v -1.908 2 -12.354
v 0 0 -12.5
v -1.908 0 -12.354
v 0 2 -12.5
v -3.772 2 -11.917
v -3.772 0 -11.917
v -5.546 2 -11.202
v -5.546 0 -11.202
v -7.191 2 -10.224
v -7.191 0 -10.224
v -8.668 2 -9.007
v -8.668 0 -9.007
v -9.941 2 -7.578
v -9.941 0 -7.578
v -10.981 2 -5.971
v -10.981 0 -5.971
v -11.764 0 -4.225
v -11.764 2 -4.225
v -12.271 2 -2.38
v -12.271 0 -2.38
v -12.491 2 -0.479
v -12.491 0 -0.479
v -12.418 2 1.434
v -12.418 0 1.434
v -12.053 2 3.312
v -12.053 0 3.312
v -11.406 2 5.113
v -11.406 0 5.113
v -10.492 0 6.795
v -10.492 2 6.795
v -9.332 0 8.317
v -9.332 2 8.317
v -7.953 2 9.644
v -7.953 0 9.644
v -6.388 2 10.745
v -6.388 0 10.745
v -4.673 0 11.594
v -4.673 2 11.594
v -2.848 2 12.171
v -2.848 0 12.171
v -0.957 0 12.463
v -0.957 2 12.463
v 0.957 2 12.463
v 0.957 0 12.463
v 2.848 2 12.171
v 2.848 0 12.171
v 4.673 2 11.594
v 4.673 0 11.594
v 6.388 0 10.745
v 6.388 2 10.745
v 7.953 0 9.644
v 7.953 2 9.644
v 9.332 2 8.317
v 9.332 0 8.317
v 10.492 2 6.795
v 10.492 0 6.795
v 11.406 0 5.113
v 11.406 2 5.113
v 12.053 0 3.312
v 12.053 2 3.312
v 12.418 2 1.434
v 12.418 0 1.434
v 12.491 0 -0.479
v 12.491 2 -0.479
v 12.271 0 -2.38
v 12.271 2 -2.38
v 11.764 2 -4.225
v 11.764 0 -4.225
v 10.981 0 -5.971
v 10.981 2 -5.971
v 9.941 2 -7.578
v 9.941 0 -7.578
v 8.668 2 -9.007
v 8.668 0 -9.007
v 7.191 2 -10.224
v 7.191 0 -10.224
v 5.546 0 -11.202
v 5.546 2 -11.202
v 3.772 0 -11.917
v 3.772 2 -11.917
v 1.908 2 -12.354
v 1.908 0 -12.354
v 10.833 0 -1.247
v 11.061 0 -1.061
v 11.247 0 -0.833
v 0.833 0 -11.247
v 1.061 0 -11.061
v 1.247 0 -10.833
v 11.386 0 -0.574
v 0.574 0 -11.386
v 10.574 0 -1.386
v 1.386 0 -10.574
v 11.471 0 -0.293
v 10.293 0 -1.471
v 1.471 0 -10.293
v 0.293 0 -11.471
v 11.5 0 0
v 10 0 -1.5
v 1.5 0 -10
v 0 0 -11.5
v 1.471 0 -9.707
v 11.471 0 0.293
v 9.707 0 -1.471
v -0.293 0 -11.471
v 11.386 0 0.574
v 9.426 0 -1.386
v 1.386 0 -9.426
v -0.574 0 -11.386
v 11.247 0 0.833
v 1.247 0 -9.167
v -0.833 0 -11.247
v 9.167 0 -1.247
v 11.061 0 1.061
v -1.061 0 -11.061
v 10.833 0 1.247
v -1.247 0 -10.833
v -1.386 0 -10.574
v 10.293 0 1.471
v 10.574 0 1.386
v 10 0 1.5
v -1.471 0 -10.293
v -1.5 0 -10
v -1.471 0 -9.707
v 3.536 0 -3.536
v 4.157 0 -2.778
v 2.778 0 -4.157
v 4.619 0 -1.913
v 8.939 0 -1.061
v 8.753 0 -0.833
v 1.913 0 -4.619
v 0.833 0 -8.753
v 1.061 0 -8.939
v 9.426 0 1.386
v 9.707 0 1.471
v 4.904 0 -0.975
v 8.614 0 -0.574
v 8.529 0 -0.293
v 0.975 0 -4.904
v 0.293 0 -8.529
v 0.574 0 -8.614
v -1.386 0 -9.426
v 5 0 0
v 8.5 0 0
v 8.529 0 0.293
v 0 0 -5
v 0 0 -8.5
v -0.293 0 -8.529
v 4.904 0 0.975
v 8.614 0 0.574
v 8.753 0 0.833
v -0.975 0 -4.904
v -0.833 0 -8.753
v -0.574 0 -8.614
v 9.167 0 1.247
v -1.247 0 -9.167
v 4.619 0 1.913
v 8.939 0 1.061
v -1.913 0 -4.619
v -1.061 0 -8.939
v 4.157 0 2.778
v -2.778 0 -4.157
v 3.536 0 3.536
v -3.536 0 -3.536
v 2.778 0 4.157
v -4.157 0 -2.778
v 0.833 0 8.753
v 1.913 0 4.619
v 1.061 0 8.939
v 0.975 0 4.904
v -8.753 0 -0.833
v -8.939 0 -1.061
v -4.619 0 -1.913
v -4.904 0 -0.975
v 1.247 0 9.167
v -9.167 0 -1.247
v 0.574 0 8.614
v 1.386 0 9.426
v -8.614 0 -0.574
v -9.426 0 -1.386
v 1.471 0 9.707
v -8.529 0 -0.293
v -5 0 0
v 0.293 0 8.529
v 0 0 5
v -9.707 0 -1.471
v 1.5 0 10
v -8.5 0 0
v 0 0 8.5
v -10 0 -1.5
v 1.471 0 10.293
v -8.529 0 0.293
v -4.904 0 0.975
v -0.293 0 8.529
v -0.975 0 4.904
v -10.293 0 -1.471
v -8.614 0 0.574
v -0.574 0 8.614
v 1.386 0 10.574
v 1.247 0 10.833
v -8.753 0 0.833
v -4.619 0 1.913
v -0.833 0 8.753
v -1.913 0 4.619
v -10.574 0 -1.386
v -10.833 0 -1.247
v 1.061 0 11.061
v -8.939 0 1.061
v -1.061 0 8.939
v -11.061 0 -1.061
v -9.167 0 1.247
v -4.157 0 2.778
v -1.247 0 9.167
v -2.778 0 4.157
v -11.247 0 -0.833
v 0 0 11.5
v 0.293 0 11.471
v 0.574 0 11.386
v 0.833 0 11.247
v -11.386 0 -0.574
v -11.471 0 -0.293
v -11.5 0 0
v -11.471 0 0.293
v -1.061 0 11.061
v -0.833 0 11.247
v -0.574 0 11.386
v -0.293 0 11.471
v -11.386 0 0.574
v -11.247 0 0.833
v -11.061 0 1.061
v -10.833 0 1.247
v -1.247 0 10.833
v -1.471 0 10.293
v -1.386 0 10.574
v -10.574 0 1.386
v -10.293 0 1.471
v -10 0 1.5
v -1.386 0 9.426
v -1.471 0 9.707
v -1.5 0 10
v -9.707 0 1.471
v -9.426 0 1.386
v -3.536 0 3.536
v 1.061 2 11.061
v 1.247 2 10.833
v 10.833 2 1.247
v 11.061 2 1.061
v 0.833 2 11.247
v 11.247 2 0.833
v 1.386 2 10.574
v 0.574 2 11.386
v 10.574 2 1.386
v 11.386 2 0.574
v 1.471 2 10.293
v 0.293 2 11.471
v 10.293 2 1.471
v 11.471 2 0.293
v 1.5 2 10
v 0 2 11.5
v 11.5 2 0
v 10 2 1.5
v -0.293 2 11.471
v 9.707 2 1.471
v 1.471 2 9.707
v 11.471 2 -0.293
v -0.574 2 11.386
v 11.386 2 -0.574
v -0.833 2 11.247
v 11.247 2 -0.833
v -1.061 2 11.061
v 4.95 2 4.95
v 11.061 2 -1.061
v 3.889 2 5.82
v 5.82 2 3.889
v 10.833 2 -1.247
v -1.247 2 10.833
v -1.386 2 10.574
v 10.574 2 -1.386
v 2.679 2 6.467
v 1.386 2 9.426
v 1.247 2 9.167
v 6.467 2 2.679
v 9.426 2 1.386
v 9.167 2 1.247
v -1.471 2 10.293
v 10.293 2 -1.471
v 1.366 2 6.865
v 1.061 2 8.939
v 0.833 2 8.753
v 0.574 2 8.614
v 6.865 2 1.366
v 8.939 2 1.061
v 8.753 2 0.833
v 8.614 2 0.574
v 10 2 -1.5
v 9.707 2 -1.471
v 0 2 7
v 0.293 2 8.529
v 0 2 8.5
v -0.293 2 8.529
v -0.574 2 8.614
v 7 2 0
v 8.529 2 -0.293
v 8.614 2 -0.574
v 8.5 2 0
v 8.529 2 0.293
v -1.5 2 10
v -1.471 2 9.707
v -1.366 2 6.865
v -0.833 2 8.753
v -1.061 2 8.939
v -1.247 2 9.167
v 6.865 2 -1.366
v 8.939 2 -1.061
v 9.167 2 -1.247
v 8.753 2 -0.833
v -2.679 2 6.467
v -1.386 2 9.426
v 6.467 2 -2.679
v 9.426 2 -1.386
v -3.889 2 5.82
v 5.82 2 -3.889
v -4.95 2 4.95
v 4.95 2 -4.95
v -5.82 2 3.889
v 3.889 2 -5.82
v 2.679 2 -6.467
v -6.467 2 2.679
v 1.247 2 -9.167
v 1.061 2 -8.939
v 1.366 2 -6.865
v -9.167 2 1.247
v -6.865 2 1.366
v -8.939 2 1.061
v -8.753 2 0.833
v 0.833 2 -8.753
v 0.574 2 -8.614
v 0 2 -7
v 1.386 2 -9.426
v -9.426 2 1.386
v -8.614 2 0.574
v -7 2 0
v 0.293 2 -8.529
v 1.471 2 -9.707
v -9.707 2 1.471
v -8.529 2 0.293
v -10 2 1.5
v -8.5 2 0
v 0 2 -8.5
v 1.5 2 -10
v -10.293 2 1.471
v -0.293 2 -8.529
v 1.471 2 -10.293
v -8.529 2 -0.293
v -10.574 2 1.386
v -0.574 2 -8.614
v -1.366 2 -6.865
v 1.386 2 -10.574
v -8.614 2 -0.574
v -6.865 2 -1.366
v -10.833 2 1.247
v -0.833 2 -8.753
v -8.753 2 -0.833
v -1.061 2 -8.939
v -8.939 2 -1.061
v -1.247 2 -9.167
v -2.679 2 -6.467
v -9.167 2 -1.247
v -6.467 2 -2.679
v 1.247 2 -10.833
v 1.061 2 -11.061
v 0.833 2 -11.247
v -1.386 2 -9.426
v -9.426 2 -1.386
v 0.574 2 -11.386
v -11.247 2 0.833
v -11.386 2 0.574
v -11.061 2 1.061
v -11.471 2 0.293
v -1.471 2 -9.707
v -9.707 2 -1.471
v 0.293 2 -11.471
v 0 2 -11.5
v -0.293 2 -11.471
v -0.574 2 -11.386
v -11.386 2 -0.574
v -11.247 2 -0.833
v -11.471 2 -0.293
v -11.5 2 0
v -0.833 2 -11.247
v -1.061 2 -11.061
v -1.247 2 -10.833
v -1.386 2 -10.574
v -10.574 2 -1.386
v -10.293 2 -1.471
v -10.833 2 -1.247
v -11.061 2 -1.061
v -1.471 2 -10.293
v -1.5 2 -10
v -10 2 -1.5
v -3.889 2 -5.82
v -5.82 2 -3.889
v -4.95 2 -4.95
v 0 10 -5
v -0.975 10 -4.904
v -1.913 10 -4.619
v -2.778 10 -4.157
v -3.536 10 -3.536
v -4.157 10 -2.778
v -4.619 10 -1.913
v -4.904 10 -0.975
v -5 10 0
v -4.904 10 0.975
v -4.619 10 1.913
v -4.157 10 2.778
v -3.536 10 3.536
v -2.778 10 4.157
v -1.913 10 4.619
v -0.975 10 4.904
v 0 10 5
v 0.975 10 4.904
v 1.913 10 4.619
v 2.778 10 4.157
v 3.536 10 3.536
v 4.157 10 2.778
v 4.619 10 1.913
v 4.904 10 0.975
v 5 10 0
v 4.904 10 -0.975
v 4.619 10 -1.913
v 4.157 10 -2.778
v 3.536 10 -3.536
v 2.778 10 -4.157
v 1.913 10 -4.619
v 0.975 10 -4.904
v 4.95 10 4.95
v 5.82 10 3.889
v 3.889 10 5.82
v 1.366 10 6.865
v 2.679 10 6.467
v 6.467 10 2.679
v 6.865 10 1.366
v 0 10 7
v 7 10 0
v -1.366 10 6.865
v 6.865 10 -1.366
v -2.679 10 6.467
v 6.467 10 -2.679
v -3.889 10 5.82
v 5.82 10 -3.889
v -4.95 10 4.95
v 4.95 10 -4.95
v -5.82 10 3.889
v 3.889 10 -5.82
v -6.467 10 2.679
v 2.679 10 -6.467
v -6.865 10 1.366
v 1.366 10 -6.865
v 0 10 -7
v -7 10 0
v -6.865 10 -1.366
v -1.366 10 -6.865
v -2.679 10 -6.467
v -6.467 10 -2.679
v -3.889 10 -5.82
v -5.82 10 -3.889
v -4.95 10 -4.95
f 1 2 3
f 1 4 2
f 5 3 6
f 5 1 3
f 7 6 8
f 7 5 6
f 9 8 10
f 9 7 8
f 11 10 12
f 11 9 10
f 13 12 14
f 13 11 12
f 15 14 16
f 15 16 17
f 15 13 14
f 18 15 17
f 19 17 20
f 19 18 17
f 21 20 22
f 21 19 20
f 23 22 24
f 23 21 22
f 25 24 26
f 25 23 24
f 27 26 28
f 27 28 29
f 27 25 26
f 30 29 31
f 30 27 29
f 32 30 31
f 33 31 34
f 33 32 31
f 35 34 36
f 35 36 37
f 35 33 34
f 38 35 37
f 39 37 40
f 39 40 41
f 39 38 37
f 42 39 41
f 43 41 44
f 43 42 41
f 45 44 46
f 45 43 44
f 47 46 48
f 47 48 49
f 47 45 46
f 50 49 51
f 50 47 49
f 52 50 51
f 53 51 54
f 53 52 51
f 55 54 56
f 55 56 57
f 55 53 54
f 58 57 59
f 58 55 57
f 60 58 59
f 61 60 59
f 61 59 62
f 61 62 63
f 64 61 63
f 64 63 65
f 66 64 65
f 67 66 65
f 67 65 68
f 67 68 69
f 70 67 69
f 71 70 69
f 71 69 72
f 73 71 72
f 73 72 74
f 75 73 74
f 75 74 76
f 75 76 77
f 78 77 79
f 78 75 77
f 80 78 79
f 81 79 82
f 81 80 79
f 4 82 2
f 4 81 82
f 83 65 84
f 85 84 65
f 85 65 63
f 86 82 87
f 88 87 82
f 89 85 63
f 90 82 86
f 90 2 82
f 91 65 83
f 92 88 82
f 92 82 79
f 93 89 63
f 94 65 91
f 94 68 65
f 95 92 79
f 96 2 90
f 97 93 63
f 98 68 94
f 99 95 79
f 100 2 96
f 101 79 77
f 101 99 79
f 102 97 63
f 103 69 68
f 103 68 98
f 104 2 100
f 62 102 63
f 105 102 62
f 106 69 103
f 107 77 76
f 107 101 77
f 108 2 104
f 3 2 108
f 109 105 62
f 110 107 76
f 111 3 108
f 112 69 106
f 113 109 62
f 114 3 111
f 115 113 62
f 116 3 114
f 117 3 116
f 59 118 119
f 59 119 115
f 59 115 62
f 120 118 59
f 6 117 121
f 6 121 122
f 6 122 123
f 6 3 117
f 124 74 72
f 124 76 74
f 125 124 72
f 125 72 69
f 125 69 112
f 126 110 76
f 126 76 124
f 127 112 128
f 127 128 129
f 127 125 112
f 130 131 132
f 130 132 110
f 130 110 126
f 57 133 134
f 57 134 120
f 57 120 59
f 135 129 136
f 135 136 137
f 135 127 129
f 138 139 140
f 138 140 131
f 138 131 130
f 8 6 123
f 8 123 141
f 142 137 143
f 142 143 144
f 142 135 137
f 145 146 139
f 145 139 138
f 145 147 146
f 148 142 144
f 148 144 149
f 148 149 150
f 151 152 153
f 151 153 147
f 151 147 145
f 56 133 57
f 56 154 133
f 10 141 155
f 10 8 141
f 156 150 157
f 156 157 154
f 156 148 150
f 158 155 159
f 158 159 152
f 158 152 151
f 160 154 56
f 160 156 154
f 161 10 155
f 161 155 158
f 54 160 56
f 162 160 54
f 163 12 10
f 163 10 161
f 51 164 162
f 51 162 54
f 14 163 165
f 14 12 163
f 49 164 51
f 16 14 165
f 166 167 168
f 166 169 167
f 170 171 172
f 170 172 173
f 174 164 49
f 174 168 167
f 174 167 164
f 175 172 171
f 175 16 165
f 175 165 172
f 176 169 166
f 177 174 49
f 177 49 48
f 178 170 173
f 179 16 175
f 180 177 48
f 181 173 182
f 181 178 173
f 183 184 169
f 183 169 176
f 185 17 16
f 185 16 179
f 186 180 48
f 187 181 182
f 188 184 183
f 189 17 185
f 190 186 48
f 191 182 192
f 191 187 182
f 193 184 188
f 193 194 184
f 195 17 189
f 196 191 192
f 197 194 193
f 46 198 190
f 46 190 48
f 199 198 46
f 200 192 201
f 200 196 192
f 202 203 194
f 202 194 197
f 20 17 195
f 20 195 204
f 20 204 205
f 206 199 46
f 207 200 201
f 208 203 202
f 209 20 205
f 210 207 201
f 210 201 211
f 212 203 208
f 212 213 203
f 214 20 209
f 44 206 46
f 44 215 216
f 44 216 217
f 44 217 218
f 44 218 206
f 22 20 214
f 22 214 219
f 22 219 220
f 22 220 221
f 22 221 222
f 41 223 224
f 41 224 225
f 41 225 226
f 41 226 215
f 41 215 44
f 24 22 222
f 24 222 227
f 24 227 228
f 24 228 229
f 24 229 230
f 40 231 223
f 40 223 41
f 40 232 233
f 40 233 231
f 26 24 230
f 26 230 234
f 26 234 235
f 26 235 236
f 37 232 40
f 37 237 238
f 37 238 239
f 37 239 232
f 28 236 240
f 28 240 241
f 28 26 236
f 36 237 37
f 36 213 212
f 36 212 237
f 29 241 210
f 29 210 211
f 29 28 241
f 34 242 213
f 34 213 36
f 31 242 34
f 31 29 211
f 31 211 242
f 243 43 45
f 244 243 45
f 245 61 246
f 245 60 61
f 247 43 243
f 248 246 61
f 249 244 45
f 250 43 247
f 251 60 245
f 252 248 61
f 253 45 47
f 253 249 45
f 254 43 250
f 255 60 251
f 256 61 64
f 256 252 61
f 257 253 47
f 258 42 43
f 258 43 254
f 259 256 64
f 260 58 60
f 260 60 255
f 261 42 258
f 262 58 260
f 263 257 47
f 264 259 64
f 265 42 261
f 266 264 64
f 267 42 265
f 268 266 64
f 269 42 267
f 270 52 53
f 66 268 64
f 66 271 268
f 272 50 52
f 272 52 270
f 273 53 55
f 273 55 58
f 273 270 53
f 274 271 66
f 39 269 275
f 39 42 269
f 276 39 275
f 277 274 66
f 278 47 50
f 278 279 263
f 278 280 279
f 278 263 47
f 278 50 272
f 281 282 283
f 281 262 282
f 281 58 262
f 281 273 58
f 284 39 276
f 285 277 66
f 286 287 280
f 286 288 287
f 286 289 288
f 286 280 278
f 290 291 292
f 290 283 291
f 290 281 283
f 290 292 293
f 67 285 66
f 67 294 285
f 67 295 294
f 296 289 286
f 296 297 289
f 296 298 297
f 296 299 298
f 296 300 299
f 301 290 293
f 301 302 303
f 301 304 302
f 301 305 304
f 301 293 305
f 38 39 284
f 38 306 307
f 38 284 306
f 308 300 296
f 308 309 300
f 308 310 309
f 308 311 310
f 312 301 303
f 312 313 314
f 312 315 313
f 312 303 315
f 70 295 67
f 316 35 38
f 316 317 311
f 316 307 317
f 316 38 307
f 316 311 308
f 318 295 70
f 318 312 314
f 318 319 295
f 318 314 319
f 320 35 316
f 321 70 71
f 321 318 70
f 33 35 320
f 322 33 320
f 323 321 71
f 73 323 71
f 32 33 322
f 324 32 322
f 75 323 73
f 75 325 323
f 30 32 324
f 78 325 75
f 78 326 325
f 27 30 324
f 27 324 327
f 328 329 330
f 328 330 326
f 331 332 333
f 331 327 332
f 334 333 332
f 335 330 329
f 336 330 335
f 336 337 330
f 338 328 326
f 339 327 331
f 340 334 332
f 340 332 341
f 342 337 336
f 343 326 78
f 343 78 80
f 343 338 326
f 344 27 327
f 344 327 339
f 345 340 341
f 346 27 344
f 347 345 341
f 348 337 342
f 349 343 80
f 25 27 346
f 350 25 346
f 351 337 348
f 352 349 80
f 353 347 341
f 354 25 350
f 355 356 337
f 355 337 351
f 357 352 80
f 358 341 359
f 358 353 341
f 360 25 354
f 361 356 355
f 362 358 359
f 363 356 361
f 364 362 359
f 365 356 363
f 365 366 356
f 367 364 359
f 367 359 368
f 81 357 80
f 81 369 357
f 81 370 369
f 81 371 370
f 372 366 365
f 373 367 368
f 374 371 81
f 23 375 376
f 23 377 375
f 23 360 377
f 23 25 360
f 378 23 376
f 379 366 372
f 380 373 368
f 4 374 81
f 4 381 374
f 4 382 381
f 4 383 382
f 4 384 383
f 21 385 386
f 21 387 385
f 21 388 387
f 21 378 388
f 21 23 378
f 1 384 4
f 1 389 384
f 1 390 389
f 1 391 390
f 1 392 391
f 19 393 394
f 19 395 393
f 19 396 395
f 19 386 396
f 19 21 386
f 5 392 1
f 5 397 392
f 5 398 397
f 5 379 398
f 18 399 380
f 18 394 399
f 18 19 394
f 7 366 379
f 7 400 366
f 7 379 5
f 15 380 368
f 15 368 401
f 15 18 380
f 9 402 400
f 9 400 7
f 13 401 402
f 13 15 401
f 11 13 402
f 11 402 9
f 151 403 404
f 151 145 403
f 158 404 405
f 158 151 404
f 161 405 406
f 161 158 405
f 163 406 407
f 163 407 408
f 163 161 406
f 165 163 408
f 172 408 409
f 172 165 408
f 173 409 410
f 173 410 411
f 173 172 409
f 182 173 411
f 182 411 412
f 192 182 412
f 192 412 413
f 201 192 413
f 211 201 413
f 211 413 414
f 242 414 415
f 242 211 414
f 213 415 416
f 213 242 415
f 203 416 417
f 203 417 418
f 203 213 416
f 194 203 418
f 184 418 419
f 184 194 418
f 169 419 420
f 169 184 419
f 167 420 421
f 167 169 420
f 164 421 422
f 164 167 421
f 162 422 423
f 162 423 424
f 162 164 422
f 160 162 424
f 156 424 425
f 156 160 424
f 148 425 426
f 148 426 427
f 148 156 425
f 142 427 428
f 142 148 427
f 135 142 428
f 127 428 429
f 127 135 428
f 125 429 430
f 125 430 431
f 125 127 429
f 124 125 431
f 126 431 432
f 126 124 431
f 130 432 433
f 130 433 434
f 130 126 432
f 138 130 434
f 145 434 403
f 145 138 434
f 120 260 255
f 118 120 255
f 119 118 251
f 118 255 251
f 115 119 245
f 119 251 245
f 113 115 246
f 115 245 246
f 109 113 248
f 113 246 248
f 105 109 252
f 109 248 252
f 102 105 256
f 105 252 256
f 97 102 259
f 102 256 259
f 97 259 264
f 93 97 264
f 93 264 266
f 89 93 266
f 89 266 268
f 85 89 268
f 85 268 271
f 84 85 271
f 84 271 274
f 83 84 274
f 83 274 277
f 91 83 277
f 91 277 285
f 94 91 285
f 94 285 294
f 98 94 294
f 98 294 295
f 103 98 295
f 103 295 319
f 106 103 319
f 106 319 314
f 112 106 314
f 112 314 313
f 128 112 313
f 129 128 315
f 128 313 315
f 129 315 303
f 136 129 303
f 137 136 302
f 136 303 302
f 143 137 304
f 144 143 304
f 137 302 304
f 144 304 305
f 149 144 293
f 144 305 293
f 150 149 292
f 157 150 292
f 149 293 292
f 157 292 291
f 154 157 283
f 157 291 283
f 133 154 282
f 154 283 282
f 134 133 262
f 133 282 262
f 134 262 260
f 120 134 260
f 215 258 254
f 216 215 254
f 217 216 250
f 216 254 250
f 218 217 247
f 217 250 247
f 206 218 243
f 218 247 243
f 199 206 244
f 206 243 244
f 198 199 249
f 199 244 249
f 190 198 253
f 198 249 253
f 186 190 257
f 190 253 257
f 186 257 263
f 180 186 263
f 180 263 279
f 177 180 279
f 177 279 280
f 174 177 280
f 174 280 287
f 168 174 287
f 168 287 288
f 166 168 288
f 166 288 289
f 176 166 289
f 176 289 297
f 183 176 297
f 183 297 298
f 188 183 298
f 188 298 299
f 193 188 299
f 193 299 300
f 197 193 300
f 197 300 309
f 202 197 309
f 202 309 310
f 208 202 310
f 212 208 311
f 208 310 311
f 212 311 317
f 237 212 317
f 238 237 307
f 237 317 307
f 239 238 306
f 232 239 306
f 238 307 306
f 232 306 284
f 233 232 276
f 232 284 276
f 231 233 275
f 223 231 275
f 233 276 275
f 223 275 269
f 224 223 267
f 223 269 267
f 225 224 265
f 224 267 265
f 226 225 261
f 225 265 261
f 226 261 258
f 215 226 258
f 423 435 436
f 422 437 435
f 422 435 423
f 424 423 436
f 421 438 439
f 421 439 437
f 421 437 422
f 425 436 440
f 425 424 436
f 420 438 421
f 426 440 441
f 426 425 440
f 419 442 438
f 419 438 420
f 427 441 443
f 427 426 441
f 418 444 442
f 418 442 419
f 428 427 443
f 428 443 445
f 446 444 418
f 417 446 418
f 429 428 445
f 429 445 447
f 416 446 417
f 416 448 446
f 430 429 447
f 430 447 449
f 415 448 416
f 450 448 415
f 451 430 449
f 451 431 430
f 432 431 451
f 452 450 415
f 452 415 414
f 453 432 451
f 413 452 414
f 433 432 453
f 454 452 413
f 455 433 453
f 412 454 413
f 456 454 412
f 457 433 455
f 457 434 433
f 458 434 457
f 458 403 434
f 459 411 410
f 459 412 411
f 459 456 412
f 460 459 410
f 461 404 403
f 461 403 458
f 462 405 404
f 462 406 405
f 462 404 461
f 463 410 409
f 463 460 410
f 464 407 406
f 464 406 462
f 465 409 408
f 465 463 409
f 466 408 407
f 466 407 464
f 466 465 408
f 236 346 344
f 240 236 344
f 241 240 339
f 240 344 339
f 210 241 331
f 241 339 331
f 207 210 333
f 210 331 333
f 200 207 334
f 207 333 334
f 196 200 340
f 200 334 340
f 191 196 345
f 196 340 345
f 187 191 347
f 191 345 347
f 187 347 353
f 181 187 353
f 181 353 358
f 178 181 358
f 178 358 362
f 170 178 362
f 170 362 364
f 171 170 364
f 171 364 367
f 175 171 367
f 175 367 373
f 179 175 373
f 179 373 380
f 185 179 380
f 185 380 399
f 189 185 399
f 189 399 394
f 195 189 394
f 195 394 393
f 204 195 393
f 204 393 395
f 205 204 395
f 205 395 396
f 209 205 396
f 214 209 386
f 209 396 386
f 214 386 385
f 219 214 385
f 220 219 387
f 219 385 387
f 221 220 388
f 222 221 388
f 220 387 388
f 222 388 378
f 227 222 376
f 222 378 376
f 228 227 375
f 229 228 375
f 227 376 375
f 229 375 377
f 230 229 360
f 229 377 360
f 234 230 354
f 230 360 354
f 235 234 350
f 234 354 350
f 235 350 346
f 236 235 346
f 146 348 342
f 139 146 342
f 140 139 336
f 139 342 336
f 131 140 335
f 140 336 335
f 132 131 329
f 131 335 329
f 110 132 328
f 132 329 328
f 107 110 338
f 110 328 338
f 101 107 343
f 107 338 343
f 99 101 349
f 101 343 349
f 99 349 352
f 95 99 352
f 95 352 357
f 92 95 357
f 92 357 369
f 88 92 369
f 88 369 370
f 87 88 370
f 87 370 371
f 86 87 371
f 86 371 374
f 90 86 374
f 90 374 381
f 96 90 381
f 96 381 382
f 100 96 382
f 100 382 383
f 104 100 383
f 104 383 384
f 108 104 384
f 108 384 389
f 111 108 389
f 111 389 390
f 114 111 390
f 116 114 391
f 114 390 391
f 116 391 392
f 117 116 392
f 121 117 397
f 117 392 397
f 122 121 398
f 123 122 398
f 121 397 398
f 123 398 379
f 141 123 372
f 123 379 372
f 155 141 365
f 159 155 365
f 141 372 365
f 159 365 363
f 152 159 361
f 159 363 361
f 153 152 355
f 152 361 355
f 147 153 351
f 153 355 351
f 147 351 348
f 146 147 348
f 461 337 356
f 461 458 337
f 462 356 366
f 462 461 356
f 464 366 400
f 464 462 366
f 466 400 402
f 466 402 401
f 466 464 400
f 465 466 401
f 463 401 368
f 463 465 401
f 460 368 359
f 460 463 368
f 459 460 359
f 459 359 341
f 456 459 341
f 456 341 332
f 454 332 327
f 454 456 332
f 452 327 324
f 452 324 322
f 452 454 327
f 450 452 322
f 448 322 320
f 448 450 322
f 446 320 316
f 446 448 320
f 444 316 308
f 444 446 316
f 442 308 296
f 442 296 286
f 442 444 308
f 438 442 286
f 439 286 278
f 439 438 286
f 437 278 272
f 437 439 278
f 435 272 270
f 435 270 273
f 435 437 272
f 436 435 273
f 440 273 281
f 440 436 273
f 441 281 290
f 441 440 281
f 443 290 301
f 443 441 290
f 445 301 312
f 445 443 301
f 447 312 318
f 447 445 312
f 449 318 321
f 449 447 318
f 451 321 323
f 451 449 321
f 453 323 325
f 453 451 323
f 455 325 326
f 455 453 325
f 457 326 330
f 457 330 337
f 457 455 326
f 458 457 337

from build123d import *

# Parameters (mm, degrees)
CUT_EXTRUDE1_REACH = 21.404
SKETCH2_R          = 1.5


with BuildPart() as part:
    # Sketch1 → Revolve1 (revolve)
    with BuildSketch(Plane(origin=(0, 0, 0), x_dir=(0, 0, -1), z_dir=(1, 0, 0)), mode=Mode.PRIVATE) as revolve1_sk:
        Polygon((-5, 0), (-12.5, 0), (-12.5, 2), (-7, 2), (-7, 10), (-5, 10), align=None)
    revolve(revolve1_sk.sketch.rotate(Axis((0, -0.941879477, 0), (0, 1, 0)), 180), axis=Axis((0, -0.941879477, 0), (0, 1, 0)))

    # Sketch2 → Cut-Extrude1 (cut, up to next)
    with BuildSketch(Plane(origin=(0, 2, 0), x_dir=(1, 0, 0), z_dir=(0, 1, 0)), mode=Mode.PRIVATE) as cut_extrude1_sk1:
        with Locations(Location((0, 10, 0), (0, 0, 270))):
            Circle(SKETCH2_R)
    cut_extrude1_tool1 = extrude(cut_extrude1_sk1.sketch, amount=-CUT_EXTRUDE1_REACH, mode=Mode.PRIVATE) & part.part
    # Sketch2 → Cut-Extrude1 (cut, up to next)
    with BuildSketch(Plane(origin=(0, 2, 0), x_dir=(1, 0, 0), z_dir=(0, 1, 0)), mode=Mode.PRIVATE) as cut_extrude1_sk2:
        with Locations(Location((10, 0, 0), (0, 0, 270))):
            Circle(SKETCH2_R)
    cut_extrude1_tool2 = extrude(cut_extrude1_sk2.sketch, amount=-CUT_EXTRUDE1_REACH, mode=Mode.PRIVATE) & part.part
    # Sketch2 → Cut-Extrude1 (cut, up to next)
    with BuildSketch(Plane(origin=(0, 2, 0), x_dir=(1, 0, 0), z_dir=(0, 1, 0)), mode=Mode.PRIVATE) as cut_extrude1_sk3:
        with Locations(Location((0, -10, 0), (0, 0, 270))):
            Circle(SKETCH2_R)
    cut_extrude1_tool3 = extrude(cut_extrude1_sk3.sketch, amount=-CUT_EXTRUDE1_REACH, mode=Mode.PRIVATE) & part.part
    # Sketch2 → Cut-Extrude1 (cut, up to next)
    with BuildSketch(Plane(origin=(0, 2, 0), x_dir=(1, 0, 0), z_dir=(0, 1, 0)), mode=Mode.PRIVATE) as cut_extrude1_sk4:
        with Locations(Location((-10, 0, 0), (0, 0, 270))):
            Circle(SKETCH2_R)
    cut_extrude1_tool4 = extrude(cut_extrude1_sk4.sketch, amount=-CUT_EXTRUDE1_REACH, mode=Mode.PRIVATE) & part.part
    add(cut_extrude1_tool1.solids().sort_by_distance((0, 2, -10))[0], mode=Mode.SUBTRACT)
    add(cut_extrude1_tool2.solids().sort_by_distance((10, 2, 0))[0], mode=Mode.SUBTRACT)
    add(cut_extrude1_tool3.solids().sort_by_distance((0, 2, 10))[0], mode=Mode.SUBTRACT)
    add(cut_extrude1_tool4.solids().sort_by_distance((-10, 2, 0))[0], mode=Mode.SUBTRACT)


solid = part.part
